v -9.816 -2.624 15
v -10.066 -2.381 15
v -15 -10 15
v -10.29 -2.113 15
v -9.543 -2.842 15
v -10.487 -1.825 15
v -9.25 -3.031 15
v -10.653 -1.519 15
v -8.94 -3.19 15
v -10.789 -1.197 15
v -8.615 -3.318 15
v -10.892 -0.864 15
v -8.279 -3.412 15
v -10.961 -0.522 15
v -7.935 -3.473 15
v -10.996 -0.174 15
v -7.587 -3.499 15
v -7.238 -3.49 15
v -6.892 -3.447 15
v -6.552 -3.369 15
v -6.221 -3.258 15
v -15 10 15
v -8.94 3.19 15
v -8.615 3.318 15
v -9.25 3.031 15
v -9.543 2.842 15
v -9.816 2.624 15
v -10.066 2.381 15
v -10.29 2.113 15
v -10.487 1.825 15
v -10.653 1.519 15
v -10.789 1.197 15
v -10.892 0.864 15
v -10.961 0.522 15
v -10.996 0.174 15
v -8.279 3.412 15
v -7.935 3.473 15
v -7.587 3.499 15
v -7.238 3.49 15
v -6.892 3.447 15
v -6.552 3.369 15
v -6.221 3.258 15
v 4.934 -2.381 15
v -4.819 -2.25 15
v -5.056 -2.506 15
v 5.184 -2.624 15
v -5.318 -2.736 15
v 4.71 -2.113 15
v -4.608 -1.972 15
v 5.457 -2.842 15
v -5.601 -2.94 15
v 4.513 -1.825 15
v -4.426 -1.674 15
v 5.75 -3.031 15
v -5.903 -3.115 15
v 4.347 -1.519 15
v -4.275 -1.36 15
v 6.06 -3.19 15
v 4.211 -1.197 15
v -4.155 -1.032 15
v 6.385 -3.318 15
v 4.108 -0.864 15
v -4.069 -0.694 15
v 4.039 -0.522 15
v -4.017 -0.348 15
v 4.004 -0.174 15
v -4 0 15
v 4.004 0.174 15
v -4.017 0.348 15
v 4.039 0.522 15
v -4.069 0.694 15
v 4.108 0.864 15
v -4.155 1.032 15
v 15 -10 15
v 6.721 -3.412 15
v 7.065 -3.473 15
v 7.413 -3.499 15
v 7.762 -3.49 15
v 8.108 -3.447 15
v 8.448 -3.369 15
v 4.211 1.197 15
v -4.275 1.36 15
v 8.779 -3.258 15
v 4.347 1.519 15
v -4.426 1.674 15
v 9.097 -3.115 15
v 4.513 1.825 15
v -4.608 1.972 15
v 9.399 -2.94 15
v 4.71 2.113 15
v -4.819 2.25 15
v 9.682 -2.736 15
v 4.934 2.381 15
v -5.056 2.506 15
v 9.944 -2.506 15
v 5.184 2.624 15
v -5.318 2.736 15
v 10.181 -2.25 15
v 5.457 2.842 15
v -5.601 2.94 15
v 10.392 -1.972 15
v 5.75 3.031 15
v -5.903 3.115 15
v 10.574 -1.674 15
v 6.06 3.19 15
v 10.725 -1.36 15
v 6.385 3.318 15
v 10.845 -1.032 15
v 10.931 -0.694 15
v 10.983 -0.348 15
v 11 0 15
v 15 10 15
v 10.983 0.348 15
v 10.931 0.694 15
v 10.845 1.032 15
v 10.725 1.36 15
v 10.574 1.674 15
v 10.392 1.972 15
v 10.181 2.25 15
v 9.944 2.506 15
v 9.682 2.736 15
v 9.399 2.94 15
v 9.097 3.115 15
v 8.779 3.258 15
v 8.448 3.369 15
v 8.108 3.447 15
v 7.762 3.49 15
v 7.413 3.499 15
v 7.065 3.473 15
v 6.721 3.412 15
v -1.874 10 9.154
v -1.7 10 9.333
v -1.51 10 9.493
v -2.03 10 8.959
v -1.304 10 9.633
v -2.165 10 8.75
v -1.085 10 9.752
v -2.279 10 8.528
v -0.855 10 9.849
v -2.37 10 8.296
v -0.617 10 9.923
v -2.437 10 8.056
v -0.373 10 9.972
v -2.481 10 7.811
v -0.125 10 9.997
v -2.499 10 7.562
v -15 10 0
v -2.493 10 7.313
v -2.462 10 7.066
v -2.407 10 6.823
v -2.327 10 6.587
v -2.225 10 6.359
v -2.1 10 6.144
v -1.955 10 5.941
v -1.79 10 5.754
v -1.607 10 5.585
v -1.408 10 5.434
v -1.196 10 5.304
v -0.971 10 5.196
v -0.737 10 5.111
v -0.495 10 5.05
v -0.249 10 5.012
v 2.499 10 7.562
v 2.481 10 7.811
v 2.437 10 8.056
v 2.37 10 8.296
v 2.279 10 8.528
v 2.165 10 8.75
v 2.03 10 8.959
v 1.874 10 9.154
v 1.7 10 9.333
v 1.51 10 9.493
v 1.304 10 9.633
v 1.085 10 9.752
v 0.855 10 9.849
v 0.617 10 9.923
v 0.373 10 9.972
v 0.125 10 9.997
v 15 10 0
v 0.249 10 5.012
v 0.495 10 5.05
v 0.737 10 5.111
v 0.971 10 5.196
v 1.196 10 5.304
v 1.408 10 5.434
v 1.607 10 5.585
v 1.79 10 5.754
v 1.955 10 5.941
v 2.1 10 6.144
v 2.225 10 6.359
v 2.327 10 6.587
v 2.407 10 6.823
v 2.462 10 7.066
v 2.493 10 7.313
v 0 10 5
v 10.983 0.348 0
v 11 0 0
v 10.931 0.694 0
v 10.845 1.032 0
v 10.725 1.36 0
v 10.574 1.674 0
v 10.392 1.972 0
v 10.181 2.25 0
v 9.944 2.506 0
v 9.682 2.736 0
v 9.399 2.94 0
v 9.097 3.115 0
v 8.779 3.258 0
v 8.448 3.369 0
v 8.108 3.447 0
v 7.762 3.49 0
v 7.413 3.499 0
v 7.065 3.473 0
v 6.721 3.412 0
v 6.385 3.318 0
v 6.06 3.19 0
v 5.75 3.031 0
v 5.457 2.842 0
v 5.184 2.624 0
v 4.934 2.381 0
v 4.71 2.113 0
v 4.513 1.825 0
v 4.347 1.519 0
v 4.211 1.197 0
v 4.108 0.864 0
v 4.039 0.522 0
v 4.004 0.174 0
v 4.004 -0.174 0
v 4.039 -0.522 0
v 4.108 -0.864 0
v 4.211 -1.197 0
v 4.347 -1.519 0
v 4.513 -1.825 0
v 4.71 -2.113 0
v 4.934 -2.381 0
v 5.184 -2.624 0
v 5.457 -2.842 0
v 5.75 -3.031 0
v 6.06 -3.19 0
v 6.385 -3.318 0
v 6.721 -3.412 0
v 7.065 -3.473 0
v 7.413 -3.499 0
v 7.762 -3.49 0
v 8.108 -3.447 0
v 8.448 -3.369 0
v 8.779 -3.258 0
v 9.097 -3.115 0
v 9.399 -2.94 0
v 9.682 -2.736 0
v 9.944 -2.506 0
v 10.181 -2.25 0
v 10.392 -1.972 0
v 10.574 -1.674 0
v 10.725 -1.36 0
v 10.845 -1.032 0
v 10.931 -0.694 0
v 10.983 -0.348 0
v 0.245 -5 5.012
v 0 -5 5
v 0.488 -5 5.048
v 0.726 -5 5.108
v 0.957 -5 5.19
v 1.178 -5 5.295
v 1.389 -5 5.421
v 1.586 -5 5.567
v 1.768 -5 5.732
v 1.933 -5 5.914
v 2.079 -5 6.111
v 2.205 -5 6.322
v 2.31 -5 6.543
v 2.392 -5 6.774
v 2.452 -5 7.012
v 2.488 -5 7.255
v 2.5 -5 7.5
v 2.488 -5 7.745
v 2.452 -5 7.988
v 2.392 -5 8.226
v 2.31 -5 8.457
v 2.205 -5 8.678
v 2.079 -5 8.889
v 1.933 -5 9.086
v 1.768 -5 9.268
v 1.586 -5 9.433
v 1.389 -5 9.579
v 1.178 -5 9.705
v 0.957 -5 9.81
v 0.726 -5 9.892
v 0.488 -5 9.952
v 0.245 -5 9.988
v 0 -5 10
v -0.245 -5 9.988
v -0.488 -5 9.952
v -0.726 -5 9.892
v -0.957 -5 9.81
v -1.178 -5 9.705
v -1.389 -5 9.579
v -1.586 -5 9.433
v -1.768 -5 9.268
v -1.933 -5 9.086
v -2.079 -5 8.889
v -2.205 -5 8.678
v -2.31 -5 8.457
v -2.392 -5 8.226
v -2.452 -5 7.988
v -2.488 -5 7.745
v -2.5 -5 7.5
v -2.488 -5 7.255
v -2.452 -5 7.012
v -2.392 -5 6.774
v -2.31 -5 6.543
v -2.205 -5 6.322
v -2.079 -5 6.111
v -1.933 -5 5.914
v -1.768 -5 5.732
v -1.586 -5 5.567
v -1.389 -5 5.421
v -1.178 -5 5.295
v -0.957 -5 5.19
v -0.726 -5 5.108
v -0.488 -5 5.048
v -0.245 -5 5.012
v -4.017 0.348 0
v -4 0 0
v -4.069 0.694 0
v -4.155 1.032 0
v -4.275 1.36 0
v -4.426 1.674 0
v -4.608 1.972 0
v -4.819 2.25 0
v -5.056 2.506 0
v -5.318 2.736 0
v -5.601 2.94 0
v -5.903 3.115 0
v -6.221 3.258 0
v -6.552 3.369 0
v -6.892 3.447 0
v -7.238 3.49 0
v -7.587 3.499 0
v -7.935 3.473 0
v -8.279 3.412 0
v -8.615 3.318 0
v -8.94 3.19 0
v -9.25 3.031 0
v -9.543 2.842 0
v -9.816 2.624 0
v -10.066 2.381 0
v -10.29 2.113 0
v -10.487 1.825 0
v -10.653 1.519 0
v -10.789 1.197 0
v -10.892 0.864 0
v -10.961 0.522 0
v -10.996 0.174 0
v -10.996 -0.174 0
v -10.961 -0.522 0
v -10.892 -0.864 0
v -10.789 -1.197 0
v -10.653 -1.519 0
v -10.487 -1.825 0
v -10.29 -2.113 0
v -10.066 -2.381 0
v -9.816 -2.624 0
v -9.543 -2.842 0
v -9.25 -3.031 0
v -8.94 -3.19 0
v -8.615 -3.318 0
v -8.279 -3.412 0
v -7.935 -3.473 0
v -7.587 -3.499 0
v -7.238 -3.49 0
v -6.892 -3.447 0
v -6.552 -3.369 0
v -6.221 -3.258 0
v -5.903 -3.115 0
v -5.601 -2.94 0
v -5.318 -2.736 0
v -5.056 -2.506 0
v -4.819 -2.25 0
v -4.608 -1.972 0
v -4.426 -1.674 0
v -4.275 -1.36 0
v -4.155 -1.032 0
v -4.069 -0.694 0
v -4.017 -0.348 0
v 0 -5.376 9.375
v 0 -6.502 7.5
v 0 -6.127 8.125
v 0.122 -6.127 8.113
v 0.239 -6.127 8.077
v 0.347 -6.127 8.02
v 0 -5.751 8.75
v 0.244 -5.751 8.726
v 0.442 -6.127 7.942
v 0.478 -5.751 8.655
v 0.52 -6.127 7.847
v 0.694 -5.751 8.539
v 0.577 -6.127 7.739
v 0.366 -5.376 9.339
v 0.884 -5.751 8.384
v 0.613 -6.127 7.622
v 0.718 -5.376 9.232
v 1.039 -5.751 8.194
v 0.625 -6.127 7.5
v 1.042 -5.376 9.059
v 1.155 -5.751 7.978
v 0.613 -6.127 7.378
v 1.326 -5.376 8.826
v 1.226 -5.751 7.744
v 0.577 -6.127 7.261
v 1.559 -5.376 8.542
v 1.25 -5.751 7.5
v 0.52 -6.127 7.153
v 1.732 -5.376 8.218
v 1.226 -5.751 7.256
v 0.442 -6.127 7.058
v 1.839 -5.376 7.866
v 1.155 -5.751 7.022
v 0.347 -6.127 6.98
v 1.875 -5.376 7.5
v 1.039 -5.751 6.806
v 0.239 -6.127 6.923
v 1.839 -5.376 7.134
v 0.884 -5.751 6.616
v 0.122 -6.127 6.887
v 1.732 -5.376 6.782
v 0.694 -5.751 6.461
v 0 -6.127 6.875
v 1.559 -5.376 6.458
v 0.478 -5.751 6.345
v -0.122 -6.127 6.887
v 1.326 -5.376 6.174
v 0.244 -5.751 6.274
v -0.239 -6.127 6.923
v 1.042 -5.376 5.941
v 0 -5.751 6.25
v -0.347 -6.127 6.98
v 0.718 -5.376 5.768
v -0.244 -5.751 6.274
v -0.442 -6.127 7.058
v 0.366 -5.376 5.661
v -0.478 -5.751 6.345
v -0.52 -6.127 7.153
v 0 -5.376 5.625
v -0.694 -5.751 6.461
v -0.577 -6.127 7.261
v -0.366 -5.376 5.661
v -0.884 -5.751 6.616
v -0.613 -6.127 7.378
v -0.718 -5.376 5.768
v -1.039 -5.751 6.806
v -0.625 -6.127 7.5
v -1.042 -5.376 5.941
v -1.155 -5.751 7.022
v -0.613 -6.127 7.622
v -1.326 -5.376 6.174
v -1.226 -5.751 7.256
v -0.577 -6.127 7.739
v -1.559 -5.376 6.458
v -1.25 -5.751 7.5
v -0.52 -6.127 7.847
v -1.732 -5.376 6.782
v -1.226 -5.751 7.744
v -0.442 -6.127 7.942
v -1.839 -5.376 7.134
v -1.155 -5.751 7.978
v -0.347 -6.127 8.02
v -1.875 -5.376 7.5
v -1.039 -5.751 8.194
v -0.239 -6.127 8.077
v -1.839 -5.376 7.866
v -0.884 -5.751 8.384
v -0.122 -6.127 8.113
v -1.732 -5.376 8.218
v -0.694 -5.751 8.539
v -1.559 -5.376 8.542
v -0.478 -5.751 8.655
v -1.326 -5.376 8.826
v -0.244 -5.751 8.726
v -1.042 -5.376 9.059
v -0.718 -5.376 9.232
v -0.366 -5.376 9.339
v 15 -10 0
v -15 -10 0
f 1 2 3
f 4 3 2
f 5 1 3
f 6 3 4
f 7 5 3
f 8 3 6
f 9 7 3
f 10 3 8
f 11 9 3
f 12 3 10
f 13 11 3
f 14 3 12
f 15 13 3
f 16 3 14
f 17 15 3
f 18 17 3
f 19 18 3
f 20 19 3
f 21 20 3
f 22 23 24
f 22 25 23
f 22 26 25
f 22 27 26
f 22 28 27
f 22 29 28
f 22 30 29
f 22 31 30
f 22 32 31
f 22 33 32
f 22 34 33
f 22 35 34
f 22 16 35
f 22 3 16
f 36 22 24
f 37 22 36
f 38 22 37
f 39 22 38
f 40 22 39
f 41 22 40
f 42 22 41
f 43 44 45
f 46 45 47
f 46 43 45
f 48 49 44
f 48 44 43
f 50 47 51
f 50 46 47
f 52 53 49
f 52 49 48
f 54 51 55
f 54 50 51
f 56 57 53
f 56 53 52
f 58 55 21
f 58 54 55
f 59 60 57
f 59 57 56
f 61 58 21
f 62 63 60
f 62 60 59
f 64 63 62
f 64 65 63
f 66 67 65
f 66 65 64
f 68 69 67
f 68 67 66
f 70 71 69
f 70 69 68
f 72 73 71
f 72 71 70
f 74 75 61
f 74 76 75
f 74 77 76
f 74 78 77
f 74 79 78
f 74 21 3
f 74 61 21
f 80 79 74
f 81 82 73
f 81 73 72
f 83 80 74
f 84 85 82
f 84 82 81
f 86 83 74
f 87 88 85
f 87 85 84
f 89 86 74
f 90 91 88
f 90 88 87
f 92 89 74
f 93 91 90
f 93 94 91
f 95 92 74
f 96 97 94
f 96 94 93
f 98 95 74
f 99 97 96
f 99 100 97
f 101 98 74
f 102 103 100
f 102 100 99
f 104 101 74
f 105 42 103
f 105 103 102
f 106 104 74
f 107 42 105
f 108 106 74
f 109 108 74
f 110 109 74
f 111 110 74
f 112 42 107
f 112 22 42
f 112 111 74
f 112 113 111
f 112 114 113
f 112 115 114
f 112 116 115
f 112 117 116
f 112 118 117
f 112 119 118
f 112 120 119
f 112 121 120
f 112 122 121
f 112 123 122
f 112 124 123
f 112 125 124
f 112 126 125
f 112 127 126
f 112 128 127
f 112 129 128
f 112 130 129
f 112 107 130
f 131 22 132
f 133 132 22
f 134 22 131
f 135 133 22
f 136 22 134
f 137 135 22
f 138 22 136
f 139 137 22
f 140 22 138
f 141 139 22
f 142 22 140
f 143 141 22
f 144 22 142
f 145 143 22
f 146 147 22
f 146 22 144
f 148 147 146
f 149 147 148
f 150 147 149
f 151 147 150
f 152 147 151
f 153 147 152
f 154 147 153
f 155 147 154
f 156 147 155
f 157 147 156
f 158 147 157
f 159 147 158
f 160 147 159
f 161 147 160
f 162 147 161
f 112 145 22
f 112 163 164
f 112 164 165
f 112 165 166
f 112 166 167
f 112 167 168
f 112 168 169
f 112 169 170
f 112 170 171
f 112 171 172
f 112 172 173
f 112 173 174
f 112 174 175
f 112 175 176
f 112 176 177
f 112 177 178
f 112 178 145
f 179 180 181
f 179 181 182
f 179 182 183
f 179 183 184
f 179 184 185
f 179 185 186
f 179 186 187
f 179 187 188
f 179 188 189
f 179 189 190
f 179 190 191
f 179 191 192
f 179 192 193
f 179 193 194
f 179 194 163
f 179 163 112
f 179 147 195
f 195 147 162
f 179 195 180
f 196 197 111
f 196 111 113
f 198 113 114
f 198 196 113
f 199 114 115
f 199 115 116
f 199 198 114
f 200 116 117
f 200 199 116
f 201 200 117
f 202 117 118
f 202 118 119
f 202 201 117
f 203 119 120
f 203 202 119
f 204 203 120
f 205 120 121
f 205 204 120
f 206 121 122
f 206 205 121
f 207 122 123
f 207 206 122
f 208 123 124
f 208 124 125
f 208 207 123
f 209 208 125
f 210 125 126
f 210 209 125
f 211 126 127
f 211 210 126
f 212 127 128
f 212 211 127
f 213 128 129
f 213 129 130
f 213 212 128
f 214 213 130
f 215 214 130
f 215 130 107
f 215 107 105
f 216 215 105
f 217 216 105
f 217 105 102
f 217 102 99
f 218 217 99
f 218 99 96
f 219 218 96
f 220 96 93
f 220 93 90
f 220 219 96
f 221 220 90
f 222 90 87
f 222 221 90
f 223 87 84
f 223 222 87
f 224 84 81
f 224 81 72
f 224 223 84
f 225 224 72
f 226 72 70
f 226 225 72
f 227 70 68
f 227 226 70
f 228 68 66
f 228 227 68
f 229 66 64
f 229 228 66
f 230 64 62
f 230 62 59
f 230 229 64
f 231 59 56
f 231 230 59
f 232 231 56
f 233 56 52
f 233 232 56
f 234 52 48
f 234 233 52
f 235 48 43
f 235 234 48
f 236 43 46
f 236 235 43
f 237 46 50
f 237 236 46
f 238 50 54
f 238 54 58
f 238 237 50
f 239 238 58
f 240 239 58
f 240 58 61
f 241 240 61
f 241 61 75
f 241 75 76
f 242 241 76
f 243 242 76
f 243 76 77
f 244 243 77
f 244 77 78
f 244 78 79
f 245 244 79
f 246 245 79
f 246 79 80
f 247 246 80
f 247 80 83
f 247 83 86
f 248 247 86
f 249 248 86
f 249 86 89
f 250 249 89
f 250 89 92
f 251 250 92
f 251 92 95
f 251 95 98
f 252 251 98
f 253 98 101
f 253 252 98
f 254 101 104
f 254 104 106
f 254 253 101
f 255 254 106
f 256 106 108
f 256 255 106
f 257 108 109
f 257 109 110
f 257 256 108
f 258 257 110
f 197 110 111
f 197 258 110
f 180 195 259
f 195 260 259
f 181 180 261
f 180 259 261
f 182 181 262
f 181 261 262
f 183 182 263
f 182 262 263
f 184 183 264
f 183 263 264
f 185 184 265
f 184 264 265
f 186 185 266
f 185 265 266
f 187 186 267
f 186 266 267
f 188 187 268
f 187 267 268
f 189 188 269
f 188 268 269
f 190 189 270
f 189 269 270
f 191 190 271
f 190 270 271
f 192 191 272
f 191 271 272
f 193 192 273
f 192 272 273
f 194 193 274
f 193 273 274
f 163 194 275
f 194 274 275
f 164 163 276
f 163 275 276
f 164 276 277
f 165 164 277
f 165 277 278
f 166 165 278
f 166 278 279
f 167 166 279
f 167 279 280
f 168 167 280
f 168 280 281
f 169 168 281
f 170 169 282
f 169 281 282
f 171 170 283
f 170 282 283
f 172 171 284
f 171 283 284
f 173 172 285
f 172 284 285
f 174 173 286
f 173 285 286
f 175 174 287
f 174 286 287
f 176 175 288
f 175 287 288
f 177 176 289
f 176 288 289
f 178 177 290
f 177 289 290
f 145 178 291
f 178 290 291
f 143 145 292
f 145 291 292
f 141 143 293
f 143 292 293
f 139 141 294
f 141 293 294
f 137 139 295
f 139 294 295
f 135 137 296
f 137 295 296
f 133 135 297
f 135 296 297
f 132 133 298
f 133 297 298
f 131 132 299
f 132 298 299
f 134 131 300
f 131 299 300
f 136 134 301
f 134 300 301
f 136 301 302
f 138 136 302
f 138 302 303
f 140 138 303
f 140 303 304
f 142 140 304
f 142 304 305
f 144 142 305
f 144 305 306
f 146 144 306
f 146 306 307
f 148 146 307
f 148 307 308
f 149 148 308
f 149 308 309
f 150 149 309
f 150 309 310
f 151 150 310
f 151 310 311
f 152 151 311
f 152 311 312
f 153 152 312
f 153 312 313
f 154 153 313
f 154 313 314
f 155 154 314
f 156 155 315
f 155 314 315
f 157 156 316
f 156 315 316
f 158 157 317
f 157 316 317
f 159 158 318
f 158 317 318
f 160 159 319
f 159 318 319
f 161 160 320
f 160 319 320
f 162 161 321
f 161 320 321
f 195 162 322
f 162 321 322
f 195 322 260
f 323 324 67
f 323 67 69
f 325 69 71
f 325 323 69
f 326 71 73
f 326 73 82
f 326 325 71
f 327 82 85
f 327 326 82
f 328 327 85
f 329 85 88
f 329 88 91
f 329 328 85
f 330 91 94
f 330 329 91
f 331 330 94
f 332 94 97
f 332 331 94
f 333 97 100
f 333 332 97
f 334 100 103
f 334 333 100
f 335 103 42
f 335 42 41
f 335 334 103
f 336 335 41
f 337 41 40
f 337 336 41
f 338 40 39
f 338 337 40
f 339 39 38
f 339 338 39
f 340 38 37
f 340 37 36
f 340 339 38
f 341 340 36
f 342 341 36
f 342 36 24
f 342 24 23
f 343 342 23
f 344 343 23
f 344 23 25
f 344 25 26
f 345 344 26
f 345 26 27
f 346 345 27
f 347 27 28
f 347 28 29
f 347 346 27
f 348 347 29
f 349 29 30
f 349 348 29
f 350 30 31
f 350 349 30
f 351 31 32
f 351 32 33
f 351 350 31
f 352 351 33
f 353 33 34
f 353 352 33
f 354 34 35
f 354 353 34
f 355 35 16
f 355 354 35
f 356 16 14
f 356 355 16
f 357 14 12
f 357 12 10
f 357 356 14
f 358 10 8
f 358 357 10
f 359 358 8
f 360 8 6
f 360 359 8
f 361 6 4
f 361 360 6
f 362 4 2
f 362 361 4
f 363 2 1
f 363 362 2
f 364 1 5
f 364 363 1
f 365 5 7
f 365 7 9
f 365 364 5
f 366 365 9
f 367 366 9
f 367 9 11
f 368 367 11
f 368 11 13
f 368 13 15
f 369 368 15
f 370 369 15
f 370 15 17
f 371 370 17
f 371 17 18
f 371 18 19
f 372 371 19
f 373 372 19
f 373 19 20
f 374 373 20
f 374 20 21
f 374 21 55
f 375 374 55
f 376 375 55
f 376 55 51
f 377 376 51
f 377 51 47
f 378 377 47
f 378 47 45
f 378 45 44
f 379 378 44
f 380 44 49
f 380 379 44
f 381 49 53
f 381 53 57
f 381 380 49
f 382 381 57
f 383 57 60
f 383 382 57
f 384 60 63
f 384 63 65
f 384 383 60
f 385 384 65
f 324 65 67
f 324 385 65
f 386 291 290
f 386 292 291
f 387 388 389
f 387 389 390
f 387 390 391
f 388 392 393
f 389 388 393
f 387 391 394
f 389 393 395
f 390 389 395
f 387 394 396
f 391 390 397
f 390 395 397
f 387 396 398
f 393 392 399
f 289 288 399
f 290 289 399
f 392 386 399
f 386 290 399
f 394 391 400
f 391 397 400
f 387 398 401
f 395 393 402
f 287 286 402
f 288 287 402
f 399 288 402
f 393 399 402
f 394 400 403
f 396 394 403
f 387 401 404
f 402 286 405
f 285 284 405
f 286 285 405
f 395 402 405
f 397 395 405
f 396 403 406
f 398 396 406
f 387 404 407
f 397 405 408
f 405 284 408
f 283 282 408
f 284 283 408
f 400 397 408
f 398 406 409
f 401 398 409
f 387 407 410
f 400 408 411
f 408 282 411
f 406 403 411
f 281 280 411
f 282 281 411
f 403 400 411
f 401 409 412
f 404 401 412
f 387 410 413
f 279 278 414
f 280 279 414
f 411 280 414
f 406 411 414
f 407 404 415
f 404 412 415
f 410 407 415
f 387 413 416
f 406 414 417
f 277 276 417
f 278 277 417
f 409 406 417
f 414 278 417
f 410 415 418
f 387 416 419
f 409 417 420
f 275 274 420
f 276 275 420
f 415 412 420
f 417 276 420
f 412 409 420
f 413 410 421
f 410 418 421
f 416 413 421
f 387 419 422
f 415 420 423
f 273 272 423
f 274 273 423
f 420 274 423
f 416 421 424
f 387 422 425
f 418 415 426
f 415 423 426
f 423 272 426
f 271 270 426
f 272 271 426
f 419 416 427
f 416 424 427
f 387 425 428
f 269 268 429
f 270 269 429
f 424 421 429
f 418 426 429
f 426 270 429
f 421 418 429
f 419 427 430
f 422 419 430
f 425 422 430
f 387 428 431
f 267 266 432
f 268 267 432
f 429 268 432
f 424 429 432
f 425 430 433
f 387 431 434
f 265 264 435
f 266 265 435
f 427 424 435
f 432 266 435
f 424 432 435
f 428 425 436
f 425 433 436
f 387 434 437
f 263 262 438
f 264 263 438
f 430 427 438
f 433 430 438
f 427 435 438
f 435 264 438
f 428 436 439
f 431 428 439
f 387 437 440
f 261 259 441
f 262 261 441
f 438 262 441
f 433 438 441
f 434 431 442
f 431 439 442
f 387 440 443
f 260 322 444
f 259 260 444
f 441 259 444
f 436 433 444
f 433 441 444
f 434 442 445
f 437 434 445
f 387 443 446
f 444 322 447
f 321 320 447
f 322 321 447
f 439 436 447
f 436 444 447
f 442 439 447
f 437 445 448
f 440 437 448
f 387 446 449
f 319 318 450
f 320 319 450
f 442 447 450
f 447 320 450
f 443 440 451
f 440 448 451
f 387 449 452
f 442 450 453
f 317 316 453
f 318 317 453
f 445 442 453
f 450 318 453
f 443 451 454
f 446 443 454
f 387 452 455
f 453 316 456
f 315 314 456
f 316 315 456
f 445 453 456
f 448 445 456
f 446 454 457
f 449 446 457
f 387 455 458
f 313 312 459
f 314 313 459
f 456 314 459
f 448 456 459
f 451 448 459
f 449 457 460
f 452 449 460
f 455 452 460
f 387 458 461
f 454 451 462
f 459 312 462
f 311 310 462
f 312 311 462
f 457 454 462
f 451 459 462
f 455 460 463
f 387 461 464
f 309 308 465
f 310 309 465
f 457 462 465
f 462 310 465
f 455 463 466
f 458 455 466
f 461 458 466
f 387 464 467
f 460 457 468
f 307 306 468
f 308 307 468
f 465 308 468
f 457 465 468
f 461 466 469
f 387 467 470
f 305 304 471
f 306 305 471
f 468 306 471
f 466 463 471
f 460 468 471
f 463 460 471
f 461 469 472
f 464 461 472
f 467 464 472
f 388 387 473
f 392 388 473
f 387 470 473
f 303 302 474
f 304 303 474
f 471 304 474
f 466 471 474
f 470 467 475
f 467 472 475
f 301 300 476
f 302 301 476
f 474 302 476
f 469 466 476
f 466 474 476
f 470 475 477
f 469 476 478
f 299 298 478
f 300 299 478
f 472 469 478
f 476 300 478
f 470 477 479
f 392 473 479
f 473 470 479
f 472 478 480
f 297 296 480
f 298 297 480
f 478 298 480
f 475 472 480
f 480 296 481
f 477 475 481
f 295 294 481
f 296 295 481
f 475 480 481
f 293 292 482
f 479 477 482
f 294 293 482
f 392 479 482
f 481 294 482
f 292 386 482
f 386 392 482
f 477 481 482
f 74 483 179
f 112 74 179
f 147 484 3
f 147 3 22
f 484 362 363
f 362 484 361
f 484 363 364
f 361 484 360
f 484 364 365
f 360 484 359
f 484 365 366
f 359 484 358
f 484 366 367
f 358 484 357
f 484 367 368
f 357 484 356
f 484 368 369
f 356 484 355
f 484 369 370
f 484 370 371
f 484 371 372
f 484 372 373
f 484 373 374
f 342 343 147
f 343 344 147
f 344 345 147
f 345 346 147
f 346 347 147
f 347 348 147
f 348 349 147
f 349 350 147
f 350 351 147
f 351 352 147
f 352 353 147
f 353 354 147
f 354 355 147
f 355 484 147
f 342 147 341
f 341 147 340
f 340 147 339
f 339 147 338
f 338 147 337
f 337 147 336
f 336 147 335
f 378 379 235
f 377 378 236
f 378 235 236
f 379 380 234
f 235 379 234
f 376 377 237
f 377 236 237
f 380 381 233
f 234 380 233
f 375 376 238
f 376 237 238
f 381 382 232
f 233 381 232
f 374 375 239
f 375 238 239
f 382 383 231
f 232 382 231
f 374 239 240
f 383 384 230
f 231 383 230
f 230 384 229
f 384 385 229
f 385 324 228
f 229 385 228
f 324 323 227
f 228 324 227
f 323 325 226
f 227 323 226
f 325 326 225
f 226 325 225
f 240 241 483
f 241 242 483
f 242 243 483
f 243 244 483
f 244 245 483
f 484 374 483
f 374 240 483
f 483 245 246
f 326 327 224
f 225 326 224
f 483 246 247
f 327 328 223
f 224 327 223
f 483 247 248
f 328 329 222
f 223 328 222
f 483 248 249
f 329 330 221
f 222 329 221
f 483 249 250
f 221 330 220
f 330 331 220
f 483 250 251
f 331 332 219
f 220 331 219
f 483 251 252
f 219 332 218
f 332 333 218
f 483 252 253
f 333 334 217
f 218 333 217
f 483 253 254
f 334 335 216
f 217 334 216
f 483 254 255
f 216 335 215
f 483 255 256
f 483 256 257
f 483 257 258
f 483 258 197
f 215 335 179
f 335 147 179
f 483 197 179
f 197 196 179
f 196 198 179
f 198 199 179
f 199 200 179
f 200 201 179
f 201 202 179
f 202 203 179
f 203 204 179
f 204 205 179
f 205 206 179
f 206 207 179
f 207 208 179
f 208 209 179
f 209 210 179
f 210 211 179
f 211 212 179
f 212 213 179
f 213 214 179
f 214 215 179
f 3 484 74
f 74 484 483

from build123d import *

# Parameters (mm, degrees)
SKETCH_1_W             = 30
SKETCH_1_H             = 20
SKETCH_1_R             = 3.5
EXTRUDE_1_DEPTH        = 15
HOLE_WIZARD_M6_1_D     = 5
HOLE_WIZARD_M6_1_DEPTH = 15
HOLE_WIZARD_M6_1_TIP   = 1.502151548


with BuildPart() as part:
    # 草图1 → 凸台-拉伸1 (new body)
    with BuildSketch(Plane.XY):
        Rectangle(SKETCH_1_W, SKETCH_1_H)
        with Locations((-7.5, 0)):
            Circle(SKETCH_1_R, mode=Mode.SUBTRACT)
        with Locations((7.5, 0)):
            Circle(SKETCH_1_R, mode=Mode.SUBTRACT)
    extrude(amount=EXTRUDE_1_DEPTH)

    # M6 螺纹孔1
    with Locations(Plane(origin=(0, 10, 7.5), x_dir=(0, 0, 1), z_dir=(0, 1, 0))):
        with Locations((0, 0)):
            Hole(HOLE_WIZARD_M6_1_D / 2, depth=HOLE_WIZARD_M6_1_DEPTH)
            with Locations((0, 0, -(HOLE_WIZARD_M6_1_DEPTH + HOLE_WIZARD_M6_1_TIP / 2))):  # 118° drill point
                Cone(0, HOLE_WIZARD_M6_1_D / 2, HOLE_WIZARD_M6_1_TIP, mode=Mode.SUBTRACT)


solid = part.part
